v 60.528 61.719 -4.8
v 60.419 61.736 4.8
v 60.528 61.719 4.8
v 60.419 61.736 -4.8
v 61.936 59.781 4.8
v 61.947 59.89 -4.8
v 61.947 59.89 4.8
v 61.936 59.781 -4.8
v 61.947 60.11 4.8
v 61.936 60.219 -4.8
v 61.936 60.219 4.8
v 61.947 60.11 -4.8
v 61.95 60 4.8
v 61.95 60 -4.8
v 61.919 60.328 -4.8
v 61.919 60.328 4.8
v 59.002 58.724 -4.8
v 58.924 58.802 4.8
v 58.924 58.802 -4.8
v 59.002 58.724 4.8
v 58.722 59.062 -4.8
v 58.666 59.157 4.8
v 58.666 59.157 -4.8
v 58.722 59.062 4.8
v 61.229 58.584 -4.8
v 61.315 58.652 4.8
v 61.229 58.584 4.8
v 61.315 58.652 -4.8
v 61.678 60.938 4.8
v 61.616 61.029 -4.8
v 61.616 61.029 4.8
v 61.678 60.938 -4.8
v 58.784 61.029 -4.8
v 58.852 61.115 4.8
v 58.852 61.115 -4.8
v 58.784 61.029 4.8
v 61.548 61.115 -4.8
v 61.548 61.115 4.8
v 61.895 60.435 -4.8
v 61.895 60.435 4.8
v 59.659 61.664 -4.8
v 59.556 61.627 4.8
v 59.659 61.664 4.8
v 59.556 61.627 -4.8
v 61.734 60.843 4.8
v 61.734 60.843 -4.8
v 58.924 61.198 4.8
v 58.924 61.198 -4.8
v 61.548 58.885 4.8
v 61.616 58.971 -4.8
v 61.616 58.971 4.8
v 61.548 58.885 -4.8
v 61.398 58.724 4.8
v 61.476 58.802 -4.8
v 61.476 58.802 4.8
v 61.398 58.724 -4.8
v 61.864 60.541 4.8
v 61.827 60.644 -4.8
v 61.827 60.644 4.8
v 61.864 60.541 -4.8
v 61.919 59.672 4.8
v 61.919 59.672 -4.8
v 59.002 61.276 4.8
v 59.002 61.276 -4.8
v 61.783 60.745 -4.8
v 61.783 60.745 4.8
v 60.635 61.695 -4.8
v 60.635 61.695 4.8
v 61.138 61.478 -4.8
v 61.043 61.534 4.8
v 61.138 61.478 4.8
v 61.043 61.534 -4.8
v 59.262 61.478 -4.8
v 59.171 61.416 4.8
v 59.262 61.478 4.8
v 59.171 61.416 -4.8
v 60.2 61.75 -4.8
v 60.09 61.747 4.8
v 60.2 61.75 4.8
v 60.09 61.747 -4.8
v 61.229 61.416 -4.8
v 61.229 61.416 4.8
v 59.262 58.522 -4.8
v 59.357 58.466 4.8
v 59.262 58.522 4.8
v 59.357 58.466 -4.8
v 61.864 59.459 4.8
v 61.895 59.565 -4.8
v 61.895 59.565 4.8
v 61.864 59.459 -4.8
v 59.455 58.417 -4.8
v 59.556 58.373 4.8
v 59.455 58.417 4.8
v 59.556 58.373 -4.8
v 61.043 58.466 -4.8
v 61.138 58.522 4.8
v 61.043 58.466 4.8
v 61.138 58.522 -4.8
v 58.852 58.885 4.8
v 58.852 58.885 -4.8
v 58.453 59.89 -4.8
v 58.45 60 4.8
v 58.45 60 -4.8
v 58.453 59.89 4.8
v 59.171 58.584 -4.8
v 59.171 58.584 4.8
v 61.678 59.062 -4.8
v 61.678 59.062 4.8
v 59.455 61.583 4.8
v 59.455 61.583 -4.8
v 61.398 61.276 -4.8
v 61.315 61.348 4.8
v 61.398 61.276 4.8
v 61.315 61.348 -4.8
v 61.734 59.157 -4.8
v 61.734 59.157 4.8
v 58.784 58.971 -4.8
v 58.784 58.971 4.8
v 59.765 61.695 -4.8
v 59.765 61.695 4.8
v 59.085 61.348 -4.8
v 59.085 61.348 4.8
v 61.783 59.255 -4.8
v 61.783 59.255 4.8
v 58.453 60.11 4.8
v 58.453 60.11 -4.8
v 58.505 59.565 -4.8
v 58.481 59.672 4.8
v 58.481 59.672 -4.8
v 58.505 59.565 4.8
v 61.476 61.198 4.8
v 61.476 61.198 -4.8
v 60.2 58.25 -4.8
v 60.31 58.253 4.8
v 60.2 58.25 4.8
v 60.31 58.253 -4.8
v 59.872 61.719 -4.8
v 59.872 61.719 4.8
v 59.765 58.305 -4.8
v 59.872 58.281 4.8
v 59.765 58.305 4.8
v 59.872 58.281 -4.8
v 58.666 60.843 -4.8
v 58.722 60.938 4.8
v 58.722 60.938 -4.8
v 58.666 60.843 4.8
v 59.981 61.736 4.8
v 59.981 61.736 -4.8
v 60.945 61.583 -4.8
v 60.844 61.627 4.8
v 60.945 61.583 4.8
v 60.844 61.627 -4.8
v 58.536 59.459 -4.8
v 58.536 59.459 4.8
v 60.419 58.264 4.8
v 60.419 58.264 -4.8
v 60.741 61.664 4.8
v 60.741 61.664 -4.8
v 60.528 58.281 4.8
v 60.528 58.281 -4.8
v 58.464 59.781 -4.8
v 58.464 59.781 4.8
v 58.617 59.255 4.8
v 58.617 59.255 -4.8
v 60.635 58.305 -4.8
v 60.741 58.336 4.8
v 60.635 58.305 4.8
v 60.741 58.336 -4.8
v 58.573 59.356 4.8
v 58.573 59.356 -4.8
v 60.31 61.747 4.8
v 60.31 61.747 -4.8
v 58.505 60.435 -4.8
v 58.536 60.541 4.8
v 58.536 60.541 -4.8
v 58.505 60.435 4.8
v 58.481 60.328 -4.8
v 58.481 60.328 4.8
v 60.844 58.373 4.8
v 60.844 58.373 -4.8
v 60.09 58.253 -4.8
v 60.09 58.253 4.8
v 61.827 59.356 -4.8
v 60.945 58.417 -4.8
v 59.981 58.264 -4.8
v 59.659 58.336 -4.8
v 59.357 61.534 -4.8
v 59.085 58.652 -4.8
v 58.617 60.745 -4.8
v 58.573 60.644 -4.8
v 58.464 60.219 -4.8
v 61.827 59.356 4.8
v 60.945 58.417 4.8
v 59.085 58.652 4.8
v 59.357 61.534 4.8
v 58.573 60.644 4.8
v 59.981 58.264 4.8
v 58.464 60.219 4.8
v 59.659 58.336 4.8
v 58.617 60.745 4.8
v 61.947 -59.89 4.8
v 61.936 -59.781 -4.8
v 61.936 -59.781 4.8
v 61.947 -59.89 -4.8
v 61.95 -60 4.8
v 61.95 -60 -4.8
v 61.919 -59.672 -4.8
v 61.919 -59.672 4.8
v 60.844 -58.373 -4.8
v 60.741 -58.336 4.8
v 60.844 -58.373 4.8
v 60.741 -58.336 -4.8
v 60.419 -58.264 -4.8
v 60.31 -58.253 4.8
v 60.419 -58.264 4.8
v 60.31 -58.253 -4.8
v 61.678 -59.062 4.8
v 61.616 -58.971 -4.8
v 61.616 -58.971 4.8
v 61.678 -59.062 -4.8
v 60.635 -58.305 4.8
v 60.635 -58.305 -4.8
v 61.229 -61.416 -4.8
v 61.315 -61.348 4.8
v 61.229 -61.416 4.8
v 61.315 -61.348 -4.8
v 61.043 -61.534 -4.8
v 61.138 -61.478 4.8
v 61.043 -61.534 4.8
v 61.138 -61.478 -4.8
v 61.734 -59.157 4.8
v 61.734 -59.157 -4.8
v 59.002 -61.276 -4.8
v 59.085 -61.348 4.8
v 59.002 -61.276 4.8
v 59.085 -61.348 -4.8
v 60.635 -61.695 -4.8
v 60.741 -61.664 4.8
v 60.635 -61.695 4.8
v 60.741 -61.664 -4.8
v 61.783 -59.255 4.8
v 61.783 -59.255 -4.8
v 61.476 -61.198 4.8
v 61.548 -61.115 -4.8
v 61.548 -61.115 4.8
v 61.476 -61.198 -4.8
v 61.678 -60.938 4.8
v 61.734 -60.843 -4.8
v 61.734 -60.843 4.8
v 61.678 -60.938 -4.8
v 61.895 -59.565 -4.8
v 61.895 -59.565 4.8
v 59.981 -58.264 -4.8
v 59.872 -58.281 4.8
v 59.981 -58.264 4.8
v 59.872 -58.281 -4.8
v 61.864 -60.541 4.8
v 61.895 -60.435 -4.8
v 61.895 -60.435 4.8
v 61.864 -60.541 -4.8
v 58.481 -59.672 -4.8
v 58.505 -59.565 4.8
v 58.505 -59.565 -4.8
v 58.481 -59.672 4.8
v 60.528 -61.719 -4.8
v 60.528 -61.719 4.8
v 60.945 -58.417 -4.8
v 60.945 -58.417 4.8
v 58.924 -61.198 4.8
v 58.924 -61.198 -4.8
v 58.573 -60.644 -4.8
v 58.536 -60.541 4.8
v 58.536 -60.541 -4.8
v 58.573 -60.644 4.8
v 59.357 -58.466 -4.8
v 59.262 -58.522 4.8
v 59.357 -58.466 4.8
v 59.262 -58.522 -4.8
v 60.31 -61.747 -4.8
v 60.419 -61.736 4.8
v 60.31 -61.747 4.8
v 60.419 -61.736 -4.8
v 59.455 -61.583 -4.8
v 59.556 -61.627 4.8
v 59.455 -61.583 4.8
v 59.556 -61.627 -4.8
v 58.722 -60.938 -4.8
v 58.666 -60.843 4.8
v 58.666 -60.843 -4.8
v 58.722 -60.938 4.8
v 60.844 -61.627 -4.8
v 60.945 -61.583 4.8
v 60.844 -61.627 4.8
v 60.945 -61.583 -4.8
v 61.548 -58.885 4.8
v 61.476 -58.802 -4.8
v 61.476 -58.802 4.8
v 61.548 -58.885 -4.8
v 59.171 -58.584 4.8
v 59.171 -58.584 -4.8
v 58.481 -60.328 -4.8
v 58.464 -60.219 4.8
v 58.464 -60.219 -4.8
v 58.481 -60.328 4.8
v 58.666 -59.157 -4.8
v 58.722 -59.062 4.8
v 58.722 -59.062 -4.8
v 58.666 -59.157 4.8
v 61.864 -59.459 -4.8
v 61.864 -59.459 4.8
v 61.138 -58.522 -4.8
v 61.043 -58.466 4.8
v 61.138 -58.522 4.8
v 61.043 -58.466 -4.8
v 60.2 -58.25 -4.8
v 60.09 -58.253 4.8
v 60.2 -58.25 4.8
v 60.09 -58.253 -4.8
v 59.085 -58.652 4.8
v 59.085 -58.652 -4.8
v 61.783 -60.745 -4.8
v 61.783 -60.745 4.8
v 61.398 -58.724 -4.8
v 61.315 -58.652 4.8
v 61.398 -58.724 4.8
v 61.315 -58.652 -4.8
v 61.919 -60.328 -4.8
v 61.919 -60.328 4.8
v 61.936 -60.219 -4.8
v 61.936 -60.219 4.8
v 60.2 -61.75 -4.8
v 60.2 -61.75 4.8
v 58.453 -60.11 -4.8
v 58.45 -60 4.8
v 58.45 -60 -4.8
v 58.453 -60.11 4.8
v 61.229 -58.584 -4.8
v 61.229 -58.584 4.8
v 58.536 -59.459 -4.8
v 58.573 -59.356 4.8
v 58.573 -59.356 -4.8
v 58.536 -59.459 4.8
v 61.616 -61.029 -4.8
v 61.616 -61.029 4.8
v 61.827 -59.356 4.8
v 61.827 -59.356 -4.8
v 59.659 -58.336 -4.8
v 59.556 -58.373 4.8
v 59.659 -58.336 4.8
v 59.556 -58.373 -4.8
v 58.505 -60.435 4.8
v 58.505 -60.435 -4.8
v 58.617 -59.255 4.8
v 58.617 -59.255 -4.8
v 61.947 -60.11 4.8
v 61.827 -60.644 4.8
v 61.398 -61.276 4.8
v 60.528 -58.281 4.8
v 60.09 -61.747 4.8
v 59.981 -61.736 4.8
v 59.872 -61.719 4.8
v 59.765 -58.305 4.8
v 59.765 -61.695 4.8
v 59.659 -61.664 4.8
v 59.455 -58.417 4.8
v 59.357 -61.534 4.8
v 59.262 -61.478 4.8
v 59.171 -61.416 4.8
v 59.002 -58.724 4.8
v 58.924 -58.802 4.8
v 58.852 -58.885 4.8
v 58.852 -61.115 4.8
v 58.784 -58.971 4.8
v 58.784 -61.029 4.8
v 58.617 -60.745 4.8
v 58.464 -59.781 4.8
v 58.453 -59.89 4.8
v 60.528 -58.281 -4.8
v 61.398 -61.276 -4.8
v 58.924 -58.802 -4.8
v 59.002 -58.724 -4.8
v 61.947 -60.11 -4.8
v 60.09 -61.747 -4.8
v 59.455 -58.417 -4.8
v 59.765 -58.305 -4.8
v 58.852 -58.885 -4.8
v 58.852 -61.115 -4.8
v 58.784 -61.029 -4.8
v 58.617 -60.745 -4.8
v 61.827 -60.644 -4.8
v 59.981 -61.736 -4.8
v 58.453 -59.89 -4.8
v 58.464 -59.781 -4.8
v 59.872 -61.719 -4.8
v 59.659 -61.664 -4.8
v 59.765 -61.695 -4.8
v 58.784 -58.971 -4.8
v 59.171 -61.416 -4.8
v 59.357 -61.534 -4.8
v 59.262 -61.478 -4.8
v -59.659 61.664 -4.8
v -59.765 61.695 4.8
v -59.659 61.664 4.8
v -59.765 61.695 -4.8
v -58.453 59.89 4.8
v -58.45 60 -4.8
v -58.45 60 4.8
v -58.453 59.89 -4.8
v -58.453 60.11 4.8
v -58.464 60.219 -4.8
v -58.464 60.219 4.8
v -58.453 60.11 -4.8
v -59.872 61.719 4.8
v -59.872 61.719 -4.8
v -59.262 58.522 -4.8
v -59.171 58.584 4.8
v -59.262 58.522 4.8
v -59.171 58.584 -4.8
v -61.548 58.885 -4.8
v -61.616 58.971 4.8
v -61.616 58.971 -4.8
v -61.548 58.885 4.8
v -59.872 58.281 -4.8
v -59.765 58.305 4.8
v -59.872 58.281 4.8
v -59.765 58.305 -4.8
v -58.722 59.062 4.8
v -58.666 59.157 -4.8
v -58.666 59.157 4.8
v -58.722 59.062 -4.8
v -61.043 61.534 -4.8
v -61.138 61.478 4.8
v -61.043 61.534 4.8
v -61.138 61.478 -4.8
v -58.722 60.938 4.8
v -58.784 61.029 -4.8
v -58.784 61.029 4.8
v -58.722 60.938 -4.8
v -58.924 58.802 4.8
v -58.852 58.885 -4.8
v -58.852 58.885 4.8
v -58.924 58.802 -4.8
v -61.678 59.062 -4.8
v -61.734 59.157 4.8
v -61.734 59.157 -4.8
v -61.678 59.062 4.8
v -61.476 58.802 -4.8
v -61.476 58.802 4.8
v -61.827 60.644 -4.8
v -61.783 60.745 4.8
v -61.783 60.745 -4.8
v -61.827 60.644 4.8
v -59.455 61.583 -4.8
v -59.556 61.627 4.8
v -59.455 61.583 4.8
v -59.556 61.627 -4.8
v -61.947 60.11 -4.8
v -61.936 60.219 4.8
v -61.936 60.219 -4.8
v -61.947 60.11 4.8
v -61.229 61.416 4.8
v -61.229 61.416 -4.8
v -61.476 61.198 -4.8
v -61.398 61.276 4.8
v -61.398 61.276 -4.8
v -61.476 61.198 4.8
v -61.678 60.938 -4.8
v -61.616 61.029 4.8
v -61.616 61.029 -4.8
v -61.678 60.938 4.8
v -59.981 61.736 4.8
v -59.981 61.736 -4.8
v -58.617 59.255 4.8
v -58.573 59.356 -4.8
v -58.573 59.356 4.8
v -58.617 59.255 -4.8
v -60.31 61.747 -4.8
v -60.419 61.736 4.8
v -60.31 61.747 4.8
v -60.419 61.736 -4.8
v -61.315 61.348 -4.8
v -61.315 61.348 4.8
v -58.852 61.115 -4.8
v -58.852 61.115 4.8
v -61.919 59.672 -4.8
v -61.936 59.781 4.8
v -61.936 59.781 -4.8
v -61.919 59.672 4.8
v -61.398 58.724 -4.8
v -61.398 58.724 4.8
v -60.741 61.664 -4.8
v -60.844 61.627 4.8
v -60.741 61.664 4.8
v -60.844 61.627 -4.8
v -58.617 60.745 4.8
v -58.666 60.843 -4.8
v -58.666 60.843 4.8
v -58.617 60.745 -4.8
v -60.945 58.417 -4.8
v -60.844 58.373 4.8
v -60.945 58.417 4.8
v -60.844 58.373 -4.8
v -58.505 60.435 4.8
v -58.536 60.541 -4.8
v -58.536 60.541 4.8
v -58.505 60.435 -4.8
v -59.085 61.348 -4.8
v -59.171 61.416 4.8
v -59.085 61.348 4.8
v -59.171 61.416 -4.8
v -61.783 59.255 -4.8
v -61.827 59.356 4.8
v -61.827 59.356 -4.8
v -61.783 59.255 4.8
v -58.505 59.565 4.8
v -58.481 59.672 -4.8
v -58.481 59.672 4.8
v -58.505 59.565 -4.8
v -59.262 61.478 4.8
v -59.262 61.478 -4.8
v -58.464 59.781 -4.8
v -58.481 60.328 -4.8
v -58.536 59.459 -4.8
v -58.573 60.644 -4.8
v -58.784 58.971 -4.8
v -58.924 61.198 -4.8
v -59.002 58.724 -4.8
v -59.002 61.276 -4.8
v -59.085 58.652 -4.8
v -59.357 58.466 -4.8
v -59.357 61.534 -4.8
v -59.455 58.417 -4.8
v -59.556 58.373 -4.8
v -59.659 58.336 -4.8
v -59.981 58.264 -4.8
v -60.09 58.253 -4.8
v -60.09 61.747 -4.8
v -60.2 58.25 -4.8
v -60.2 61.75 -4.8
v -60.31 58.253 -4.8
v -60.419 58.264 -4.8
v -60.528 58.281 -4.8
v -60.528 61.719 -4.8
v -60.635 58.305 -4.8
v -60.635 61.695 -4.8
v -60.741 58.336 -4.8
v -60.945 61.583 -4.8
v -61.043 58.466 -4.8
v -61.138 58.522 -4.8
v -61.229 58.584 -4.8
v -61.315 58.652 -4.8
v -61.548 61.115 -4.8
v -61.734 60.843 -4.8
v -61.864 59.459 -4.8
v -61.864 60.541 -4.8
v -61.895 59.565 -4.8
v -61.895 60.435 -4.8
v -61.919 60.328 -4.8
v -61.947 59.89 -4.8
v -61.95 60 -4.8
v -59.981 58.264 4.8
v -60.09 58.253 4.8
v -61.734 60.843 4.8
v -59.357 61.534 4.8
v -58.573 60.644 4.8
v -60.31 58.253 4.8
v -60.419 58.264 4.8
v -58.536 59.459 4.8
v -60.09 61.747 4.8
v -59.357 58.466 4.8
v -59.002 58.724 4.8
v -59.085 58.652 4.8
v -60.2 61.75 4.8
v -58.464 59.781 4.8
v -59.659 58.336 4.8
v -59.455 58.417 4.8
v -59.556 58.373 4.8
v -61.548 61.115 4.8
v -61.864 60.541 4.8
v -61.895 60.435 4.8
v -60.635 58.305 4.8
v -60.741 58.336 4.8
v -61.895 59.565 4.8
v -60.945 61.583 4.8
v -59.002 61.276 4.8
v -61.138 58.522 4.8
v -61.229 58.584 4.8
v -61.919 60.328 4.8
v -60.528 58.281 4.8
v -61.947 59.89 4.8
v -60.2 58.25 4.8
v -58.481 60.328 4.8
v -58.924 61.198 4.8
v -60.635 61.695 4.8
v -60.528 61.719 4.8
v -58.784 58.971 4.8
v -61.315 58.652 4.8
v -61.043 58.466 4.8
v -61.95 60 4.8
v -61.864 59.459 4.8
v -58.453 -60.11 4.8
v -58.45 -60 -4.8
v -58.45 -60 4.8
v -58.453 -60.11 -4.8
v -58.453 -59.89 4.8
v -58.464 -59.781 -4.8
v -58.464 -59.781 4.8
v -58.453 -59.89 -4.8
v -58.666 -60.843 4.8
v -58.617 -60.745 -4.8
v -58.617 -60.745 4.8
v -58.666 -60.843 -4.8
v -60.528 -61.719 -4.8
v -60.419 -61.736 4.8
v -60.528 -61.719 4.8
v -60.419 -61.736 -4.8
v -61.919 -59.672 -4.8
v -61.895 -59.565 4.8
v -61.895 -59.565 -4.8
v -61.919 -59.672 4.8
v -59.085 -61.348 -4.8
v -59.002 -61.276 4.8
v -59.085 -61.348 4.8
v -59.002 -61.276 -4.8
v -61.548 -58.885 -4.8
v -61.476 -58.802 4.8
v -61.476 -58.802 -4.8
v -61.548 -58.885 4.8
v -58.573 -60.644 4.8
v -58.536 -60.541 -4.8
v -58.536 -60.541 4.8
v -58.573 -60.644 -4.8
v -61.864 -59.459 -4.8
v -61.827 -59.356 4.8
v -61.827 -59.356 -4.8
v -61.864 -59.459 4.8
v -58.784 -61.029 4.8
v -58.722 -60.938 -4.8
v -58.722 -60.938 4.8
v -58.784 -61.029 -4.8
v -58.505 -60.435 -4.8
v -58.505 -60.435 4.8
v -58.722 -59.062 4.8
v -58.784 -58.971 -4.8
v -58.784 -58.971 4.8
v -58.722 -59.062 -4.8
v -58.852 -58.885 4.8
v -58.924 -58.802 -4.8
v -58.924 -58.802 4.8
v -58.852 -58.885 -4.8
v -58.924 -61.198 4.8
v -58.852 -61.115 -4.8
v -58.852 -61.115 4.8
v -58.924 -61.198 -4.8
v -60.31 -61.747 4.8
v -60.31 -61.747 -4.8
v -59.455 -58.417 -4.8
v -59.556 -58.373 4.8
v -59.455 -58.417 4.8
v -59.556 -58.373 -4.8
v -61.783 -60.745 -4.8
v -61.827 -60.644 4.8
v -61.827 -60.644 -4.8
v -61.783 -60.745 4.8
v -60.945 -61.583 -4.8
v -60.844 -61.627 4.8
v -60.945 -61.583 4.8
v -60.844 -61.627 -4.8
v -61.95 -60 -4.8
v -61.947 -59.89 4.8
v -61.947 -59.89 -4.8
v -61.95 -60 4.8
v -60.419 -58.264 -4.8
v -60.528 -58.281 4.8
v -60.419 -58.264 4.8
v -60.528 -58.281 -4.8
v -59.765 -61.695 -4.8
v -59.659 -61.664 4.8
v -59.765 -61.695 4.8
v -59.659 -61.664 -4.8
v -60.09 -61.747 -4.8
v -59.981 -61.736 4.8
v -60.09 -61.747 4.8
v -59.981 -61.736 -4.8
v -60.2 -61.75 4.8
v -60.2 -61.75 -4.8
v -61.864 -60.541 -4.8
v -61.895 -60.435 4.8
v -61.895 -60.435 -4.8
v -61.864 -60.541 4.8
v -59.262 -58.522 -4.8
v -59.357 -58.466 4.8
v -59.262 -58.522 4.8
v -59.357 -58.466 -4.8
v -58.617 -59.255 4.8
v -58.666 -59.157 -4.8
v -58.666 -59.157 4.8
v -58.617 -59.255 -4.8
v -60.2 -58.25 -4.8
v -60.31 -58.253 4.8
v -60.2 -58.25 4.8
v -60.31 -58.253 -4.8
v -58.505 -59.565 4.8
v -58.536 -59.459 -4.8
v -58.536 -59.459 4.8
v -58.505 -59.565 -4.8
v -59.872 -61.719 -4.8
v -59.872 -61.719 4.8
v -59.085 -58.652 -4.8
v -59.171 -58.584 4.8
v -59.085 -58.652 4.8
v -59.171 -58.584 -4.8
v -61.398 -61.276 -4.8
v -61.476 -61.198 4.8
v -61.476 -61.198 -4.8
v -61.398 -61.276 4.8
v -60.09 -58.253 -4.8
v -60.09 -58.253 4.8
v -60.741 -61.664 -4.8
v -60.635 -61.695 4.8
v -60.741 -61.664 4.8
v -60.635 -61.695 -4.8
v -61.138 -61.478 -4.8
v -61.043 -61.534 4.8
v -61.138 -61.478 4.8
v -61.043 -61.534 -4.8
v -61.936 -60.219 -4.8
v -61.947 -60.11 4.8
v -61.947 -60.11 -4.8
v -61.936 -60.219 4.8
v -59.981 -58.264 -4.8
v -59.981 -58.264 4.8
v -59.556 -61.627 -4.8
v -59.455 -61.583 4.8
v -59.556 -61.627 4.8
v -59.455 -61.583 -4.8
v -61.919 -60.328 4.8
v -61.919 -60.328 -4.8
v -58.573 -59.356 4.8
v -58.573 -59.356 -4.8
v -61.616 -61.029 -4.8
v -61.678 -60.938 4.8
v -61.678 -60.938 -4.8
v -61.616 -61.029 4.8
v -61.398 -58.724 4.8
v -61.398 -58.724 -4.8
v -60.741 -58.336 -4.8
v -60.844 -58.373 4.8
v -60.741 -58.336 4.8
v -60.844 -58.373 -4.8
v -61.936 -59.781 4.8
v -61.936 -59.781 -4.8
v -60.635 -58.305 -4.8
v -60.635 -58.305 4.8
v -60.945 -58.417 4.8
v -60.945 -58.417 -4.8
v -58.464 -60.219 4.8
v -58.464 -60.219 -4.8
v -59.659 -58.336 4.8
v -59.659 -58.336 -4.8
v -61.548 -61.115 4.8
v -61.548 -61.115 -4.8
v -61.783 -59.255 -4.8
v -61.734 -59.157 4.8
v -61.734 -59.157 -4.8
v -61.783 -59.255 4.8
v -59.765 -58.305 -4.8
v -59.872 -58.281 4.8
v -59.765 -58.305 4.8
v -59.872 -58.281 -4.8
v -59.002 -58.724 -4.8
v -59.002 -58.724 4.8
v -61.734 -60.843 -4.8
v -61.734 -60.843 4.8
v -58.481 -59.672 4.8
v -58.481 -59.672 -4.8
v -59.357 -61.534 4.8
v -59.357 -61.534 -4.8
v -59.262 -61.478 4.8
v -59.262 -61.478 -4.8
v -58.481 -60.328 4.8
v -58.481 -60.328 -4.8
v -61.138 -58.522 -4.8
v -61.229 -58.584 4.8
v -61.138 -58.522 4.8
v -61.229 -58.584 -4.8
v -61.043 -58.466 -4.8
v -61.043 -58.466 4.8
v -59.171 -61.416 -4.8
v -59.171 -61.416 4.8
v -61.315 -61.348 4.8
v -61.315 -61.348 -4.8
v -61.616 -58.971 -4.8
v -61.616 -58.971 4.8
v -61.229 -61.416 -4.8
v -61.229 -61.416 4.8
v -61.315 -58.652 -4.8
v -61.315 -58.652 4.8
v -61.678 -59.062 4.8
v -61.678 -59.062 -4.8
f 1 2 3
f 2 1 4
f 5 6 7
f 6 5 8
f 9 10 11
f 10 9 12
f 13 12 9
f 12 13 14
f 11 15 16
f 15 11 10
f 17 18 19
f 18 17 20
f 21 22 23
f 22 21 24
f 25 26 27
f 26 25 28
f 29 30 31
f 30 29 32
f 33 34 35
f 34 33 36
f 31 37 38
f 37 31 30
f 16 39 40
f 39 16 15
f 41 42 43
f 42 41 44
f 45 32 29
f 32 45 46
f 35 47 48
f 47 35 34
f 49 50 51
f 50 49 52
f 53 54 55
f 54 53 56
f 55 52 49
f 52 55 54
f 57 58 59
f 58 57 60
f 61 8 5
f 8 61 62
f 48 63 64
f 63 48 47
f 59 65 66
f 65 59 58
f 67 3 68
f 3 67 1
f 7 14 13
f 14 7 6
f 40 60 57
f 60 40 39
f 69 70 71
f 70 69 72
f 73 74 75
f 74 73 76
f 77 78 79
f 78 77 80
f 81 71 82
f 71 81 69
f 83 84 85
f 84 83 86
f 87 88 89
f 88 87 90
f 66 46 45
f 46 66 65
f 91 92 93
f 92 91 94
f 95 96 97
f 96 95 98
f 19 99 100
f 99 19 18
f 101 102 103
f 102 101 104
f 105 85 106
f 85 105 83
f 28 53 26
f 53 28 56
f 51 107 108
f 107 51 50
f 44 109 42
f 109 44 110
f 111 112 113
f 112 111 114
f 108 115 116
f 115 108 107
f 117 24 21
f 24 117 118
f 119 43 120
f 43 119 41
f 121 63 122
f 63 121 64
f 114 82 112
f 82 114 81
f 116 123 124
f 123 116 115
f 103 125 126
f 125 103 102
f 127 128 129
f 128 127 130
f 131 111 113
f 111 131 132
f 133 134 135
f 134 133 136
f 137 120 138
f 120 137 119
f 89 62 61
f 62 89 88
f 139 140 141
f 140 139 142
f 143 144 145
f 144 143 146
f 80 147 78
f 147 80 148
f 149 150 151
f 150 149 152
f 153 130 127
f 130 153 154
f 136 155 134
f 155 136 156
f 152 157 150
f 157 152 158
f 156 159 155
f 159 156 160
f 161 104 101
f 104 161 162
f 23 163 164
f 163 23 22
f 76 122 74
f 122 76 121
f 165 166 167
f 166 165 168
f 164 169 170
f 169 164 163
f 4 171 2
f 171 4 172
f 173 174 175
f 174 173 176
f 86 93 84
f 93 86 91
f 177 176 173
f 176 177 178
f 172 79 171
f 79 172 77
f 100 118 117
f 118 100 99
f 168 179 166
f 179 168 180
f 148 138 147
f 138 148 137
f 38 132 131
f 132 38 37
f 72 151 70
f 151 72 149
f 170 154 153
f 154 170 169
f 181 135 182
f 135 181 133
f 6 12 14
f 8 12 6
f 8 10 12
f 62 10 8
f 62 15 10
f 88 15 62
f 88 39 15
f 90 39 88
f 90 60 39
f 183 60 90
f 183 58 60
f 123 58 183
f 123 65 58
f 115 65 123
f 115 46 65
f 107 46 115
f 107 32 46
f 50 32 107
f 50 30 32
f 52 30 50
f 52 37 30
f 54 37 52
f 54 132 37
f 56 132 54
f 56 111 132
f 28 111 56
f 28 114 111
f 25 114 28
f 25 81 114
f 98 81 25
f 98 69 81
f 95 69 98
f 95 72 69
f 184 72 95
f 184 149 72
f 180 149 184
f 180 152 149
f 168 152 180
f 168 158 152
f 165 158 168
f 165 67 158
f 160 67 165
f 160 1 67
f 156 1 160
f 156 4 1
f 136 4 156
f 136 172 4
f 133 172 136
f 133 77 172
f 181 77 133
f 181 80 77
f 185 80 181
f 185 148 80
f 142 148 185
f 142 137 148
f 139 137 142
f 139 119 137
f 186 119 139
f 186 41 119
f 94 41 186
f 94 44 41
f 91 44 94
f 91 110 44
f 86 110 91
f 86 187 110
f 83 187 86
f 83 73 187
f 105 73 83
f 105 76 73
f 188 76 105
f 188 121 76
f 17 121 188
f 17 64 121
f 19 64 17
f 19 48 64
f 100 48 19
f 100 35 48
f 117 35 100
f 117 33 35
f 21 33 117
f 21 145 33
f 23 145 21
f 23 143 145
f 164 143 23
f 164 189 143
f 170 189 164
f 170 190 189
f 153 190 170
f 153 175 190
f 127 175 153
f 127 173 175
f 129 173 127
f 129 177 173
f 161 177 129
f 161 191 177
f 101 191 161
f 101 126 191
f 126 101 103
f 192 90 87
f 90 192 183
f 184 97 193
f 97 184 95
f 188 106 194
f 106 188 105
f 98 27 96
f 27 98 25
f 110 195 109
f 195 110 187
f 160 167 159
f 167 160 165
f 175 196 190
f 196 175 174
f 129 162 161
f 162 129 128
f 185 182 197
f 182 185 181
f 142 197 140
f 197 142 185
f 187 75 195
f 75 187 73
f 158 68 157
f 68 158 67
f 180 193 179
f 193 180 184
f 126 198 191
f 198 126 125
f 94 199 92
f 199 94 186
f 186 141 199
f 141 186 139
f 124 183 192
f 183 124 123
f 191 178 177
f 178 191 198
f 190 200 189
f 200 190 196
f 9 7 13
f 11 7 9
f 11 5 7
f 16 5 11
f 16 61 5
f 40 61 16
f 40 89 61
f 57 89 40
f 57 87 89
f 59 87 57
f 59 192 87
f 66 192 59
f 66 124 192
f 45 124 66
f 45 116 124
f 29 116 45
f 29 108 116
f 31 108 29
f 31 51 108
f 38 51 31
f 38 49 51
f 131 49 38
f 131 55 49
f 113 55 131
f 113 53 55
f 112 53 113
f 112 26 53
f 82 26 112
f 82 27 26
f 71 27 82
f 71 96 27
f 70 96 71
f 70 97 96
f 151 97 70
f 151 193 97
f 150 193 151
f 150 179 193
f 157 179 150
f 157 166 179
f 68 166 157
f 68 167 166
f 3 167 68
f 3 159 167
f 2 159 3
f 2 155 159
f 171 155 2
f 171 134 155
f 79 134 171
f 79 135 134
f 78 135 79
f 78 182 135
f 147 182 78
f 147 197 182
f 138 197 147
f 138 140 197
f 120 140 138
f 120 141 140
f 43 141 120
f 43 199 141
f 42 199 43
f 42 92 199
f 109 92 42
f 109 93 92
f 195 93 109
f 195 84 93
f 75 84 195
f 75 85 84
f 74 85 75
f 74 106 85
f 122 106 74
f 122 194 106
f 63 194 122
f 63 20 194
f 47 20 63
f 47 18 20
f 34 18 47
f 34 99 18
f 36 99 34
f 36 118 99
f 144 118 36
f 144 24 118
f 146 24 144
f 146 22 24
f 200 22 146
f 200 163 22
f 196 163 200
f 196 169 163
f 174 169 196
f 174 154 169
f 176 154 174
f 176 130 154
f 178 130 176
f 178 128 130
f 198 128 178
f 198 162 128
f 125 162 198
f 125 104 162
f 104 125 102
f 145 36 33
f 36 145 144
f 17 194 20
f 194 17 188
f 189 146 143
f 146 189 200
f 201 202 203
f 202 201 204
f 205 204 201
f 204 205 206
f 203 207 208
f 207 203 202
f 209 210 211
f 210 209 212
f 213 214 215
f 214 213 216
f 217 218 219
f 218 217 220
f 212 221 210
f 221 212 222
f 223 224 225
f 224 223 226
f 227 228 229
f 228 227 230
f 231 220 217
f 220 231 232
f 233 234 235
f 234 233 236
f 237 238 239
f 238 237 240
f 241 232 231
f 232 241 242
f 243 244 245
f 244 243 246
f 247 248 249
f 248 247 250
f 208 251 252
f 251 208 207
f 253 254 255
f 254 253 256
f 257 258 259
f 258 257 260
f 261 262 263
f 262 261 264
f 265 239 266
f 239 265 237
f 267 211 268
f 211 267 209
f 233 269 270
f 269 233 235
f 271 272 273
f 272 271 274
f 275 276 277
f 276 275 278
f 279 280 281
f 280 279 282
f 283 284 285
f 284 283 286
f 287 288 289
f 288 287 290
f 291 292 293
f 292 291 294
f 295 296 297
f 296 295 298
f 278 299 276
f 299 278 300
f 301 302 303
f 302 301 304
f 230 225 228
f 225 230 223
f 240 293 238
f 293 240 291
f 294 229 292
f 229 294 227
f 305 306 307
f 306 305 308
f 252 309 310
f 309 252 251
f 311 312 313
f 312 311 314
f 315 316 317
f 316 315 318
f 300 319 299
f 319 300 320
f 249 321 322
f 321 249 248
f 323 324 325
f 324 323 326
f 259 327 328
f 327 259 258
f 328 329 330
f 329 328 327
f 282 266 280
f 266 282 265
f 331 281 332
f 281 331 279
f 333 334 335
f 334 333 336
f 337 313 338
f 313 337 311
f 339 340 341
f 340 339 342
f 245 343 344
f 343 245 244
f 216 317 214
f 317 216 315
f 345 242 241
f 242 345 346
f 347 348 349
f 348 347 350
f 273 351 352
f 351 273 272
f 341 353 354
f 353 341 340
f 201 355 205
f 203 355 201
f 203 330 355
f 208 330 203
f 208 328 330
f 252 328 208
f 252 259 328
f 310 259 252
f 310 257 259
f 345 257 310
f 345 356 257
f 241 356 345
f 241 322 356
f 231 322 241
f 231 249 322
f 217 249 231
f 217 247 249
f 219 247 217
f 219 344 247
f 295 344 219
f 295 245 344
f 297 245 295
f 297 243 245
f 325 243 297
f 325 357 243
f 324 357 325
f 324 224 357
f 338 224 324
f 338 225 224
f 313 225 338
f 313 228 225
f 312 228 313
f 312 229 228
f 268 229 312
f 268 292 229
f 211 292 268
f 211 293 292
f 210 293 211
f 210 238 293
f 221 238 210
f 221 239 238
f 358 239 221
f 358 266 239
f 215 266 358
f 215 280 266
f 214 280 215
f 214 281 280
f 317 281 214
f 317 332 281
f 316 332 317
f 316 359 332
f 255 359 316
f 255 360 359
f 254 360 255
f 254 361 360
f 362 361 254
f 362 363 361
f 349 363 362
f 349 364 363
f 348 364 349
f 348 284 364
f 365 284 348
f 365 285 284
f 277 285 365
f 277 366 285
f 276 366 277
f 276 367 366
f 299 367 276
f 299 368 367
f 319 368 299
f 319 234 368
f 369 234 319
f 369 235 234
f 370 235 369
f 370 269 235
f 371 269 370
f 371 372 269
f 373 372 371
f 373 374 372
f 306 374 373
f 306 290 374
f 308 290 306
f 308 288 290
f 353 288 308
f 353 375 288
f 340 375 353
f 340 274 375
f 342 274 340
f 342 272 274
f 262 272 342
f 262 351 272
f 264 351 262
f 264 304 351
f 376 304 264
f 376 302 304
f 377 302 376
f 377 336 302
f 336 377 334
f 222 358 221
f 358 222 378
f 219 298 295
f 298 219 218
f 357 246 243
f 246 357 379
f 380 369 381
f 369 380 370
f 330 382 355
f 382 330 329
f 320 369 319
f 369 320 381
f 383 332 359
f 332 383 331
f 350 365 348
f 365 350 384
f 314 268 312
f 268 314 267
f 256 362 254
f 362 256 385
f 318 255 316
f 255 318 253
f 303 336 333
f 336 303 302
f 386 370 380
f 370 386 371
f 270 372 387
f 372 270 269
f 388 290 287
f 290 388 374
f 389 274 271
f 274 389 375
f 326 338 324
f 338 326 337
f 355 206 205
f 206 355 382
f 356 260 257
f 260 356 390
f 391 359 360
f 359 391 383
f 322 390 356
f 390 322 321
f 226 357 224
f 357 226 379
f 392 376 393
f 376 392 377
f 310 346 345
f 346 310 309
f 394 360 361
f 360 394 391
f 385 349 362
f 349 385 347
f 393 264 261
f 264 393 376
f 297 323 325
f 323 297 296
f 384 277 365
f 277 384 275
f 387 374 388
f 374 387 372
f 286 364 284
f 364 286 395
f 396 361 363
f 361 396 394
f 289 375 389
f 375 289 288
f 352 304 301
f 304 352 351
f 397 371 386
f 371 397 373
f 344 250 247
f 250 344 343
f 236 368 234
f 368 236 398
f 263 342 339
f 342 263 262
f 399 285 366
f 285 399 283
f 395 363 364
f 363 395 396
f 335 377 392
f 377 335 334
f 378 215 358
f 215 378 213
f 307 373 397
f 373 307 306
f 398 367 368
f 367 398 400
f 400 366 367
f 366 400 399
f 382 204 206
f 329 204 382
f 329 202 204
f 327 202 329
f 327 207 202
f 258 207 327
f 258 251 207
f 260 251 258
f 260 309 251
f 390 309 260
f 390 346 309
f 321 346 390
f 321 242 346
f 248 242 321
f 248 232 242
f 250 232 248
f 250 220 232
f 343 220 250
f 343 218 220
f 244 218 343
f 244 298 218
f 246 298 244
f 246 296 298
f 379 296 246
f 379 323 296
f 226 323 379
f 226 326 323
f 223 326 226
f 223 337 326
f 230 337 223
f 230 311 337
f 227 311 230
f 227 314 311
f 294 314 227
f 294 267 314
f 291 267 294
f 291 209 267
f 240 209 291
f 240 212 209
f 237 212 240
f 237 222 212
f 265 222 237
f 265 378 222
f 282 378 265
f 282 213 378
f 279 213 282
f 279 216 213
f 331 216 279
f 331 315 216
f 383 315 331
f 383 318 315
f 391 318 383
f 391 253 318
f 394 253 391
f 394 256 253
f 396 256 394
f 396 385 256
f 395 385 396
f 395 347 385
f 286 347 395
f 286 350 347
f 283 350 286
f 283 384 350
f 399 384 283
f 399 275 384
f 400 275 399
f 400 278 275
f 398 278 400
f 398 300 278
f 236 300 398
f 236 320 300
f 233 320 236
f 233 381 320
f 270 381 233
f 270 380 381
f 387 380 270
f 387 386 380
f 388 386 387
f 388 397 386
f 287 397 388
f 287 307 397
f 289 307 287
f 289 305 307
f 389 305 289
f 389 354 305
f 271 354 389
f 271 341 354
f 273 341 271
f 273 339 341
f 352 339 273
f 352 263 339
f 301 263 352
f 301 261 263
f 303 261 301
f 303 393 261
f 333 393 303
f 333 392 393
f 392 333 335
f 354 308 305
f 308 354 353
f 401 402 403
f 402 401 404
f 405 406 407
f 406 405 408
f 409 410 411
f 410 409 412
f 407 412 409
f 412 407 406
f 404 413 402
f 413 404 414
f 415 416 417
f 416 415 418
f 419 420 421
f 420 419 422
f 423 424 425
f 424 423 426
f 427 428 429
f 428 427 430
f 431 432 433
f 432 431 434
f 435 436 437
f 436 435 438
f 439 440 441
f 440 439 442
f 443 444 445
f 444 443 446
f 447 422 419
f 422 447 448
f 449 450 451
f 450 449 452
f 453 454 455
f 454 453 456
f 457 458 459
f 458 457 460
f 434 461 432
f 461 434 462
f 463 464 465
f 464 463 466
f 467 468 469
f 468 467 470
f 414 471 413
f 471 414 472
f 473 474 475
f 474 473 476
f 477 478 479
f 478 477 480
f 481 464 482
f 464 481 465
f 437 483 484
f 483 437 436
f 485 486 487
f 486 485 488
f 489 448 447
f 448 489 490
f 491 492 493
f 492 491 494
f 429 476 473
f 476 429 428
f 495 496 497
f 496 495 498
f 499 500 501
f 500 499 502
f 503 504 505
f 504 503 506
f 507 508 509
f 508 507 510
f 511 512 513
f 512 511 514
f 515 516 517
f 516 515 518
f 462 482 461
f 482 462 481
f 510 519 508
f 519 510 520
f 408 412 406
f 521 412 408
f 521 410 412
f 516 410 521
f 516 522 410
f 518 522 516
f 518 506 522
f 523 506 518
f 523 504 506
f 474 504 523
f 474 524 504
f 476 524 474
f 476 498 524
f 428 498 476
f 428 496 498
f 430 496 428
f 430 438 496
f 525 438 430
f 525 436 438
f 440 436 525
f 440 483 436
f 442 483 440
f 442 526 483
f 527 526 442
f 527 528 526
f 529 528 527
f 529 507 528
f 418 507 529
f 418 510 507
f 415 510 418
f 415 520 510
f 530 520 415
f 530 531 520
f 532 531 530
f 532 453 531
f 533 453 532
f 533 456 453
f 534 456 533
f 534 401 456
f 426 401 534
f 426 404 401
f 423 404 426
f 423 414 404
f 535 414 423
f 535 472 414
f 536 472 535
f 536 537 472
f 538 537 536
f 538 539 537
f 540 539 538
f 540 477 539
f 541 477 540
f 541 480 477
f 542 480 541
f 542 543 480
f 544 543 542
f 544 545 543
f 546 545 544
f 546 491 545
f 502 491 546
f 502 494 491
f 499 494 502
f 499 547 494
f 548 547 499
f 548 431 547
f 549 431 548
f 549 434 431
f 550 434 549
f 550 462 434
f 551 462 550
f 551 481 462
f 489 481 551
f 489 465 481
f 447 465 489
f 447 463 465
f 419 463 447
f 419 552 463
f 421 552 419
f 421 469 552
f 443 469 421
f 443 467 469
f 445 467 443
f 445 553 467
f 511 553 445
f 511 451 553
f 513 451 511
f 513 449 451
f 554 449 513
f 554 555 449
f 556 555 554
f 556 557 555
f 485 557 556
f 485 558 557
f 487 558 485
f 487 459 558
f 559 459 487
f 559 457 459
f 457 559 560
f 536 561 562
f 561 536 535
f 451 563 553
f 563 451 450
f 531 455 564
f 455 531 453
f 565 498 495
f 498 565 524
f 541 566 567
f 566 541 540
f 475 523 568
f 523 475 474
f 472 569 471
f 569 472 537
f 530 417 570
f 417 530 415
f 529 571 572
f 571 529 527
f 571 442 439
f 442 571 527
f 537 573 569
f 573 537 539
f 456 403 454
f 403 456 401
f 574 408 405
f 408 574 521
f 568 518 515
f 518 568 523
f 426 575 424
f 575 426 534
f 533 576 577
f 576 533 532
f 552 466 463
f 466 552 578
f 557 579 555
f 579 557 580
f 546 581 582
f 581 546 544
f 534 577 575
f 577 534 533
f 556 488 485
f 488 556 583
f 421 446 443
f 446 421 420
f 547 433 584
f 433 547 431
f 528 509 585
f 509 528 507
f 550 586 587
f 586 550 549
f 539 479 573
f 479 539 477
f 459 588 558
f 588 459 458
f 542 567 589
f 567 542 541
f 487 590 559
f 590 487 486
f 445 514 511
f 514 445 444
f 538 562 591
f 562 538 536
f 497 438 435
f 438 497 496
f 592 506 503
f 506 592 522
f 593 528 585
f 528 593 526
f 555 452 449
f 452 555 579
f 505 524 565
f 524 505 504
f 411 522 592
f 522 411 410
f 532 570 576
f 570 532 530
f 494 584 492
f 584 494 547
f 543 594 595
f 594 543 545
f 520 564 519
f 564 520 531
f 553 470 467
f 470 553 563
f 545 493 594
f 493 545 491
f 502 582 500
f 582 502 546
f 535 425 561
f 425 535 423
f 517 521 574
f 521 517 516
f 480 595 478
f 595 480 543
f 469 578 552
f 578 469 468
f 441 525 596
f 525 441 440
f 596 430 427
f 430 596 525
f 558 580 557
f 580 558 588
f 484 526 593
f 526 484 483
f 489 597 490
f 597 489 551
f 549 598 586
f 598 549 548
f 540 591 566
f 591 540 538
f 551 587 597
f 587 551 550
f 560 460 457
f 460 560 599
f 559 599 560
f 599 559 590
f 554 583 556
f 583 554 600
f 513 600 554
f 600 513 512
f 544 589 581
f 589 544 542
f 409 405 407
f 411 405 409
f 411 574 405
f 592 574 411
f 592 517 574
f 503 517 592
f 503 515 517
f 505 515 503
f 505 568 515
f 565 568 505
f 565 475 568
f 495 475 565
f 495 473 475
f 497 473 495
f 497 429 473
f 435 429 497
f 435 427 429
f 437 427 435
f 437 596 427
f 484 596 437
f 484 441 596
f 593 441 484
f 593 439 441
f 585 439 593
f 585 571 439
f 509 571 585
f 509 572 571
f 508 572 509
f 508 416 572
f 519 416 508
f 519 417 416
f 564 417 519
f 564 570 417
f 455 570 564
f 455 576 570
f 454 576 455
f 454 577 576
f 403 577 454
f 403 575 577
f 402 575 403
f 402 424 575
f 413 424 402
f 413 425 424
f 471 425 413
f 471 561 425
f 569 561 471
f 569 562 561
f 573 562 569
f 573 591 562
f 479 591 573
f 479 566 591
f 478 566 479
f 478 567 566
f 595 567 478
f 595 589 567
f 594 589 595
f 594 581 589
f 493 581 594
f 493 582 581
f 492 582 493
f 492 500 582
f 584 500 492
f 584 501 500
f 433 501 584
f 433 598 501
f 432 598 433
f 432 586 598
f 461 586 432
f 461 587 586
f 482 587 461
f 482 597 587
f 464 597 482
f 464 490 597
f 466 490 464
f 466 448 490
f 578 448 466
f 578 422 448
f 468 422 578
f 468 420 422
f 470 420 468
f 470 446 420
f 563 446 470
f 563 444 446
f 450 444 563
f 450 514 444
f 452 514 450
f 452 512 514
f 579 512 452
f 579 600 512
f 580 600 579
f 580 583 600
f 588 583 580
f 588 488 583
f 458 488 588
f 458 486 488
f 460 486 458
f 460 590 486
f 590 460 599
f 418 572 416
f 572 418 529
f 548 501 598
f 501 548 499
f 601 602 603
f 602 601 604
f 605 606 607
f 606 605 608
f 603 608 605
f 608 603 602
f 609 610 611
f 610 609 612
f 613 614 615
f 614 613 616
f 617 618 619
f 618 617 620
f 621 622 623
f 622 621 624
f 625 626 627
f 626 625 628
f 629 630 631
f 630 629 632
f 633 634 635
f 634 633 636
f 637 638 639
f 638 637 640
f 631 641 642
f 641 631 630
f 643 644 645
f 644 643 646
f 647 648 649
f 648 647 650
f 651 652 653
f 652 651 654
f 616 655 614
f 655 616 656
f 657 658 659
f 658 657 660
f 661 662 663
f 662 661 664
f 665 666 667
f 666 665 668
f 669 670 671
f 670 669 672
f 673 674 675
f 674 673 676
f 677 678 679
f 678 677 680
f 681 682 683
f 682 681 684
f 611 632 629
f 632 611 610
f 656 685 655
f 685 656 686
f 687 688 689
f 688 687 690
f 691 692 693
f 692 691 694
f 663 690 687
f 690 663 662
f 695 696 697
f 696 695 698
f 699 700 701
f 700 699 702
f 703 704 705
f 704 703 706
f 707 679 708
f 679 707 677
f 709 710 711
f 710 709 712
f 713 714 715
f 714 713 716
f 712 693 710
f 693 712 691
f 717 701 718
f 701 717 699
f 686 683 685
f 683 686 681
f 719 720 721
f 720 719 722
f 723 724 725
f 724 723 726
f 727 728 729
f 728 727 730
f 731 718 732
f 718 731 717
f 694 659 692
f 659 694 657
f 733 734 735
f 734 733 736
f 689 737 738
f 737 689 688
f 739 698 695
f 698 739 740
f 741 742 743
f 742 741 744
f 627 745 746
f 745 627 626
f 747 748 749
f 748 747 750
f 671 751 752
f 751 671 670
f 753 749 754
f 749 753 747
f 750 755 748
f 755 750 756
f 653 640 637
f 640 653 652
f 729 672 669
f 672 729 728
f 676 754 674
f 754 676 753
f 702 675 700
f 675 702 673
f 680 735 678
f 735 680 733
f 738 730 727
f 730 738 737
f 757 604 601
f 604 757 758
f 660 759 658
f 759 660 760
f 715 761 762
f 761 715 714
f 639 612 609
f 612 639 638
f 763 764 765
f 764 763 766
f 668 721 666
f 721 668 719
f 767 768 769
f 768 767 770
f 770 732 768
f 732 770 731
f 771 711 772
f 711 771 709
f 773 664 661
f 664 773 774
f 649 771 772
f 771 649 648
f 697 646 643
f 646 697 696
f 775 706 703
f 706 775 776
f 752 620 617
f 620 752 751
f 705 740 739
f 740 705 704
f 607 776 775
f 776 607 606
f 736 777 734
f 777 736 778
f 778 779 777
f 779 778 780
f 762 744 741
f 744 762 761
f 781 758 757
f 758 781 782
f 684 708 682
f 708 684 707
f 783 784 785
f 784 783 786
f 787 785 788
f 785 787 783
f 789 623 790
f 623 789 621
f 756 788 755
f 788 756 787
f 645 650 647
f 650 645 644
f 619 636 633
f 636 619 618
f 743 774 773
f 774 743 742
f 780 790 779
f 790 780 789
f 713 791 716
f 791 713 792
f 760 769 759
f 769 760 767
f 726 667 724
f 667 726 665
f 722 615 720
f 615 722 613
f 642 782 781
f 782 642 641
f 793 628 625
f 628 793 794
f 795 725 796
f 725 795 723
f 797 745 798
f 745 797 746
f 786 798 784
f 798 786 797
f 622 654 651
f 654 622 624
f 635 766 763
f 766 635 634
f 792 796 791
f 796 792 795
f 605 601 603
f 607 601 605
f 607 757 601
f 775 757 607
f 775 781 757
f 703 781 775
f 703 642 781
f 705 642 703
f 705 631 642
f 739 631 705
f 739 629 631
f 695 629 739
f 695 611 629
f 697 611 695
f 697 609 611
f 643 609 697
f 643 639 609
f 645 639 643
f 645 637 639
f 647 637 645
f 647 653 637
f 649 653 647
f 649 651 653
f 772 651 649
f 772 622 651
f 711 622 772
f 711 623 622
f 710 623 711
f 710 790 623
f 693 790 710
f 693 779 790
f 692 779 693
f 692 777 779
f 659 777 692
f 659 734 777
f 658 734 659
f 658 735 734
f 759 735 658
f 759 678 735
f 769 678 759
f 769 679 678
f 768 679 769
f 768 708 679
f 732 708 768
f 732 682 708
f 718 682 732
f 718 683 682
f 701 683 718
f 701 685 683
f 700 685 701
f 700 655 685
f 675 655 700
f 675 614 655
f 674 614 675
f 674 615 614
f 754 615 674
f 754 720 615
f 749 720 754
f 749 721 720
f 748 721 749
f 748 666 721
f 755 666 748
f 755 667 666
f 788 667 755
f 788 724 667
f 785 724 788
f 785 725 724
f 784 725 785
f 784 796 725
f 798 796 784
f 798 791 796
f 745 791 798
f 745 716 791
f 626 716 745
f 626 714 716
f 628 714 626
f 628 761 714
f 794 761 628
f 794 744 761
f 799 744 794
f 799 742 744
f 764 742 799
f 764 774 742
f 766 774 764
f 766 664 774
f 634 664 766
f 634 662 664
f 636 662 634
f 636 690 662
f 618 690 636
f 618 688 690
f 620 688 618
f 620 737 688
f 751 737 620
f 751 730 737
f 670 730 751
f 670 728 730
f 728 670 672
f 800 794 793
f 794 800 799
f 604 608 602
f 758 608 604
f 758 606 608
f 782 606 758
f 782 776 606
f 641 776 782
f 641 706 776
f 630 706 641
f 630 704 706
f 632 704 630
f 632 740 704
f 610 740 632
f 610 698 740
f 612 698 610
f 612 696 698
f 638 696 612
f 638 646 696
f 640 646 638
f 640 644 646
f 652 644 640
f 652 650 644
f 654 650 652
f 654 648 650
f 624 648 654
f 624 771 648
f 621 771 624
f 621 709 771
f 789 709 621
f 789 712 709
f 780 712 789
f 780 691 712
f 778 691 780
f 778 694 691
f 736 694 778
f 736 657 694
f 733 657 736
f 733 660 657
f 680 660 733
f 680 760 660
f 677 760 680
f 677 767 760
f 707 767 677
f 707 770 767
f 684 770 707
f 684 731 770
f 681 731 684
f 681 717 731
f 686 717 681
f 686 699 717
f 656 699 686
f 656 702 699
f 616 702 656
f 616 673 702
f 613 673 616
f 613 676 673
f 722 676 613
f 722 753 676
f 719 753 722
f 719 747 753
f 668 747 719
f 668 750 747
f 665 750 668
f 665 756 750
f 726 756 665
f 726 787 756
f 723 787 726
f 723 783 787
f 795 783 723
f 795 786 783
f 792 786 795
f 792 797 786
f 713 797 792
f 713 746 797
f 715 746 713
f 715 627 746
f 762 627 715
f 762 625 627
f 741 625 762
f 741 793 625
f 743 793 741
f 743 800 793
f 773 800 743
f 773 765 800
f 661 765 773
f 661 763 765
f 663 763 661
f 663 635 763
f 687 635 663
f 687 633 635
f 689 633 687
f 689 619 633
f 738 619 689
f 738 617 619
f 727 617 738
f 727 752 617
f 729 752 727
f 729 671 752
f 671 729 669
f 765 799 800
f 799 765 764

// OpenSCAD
// file: ../configuration.scad
symfloppy_box_x_size = 140;
symfloppy_box_y_size = 200;
symfloppy_box_z_size = 30;
symfloppy_box_pane_thickness = 4.8;


button_y_front_offset = 15;
button_x_spaces = 18;
button_x_center_offset = -25;


holder_piece_x_from_z_offset = 5;
holder_piece_y_centered_holder_piece_gap = 120;
// main file
include <../configuration.scad>
holdersPiecesThrows();

module holdersPiecesThrows(
    symfloppy_box_x_size = symfloppy_box_x_size,
    holder_piece_x_from_z_offset = holder_piece_x_from_z_offset,
    symfloppy_box_pane_thickness = symfloppy_box_pane_thickness,
    throws_diameter = 3.5,
    _fn = 100
) {


    translate([
        symfloppy_box_x_size / 2 - holder_piece_x_from_z_offset - symfloppy_box_pane_thickness,
        holder_piece_y_centered_holder_piece_gap / 2,
        0
    ])
        cylinder(d=throws_diameter, h=symfloppy_box_pane_thickness * 2, center=true, $fn=_fn);


    translate([
        symfloppy_box_x_size / 2 - holder_piece_x_from_z_offset - symfloppy_box_pane_thickness,
        -holder_piece_y_centered_holder_piece_gap / 2,
        0
    ])
        cylinder(d=throws_diameter, h=symfloppy_box_pane_thickness * 2, center=true, $fn=_fn);

    translate([
        - symfloppy_box_x_size / 2 + holder_piece_x_from_z_offset + symfloppy_box_pane_thickness,
        holder_piece_y_centered_holder_piece_gap / 2,
        0
    ])
        cylinder(d=throws_diameter, h=symfloppy_box_pane_thickness * 2, center=true, $fn=_fn);
    
    translate([
        - symfloppy_box_x_size / 2 + holder_piece_x_from_z_offset + symfloppy_box_pane_thickness,
        -holder_piece_y_centered_holder_piece_gap / 2,
        0
    ])
        cylinder(d=throws_diameter, h=symfloppy_box_pane_thickness * 2, center=true, $fn=_fn);
}
